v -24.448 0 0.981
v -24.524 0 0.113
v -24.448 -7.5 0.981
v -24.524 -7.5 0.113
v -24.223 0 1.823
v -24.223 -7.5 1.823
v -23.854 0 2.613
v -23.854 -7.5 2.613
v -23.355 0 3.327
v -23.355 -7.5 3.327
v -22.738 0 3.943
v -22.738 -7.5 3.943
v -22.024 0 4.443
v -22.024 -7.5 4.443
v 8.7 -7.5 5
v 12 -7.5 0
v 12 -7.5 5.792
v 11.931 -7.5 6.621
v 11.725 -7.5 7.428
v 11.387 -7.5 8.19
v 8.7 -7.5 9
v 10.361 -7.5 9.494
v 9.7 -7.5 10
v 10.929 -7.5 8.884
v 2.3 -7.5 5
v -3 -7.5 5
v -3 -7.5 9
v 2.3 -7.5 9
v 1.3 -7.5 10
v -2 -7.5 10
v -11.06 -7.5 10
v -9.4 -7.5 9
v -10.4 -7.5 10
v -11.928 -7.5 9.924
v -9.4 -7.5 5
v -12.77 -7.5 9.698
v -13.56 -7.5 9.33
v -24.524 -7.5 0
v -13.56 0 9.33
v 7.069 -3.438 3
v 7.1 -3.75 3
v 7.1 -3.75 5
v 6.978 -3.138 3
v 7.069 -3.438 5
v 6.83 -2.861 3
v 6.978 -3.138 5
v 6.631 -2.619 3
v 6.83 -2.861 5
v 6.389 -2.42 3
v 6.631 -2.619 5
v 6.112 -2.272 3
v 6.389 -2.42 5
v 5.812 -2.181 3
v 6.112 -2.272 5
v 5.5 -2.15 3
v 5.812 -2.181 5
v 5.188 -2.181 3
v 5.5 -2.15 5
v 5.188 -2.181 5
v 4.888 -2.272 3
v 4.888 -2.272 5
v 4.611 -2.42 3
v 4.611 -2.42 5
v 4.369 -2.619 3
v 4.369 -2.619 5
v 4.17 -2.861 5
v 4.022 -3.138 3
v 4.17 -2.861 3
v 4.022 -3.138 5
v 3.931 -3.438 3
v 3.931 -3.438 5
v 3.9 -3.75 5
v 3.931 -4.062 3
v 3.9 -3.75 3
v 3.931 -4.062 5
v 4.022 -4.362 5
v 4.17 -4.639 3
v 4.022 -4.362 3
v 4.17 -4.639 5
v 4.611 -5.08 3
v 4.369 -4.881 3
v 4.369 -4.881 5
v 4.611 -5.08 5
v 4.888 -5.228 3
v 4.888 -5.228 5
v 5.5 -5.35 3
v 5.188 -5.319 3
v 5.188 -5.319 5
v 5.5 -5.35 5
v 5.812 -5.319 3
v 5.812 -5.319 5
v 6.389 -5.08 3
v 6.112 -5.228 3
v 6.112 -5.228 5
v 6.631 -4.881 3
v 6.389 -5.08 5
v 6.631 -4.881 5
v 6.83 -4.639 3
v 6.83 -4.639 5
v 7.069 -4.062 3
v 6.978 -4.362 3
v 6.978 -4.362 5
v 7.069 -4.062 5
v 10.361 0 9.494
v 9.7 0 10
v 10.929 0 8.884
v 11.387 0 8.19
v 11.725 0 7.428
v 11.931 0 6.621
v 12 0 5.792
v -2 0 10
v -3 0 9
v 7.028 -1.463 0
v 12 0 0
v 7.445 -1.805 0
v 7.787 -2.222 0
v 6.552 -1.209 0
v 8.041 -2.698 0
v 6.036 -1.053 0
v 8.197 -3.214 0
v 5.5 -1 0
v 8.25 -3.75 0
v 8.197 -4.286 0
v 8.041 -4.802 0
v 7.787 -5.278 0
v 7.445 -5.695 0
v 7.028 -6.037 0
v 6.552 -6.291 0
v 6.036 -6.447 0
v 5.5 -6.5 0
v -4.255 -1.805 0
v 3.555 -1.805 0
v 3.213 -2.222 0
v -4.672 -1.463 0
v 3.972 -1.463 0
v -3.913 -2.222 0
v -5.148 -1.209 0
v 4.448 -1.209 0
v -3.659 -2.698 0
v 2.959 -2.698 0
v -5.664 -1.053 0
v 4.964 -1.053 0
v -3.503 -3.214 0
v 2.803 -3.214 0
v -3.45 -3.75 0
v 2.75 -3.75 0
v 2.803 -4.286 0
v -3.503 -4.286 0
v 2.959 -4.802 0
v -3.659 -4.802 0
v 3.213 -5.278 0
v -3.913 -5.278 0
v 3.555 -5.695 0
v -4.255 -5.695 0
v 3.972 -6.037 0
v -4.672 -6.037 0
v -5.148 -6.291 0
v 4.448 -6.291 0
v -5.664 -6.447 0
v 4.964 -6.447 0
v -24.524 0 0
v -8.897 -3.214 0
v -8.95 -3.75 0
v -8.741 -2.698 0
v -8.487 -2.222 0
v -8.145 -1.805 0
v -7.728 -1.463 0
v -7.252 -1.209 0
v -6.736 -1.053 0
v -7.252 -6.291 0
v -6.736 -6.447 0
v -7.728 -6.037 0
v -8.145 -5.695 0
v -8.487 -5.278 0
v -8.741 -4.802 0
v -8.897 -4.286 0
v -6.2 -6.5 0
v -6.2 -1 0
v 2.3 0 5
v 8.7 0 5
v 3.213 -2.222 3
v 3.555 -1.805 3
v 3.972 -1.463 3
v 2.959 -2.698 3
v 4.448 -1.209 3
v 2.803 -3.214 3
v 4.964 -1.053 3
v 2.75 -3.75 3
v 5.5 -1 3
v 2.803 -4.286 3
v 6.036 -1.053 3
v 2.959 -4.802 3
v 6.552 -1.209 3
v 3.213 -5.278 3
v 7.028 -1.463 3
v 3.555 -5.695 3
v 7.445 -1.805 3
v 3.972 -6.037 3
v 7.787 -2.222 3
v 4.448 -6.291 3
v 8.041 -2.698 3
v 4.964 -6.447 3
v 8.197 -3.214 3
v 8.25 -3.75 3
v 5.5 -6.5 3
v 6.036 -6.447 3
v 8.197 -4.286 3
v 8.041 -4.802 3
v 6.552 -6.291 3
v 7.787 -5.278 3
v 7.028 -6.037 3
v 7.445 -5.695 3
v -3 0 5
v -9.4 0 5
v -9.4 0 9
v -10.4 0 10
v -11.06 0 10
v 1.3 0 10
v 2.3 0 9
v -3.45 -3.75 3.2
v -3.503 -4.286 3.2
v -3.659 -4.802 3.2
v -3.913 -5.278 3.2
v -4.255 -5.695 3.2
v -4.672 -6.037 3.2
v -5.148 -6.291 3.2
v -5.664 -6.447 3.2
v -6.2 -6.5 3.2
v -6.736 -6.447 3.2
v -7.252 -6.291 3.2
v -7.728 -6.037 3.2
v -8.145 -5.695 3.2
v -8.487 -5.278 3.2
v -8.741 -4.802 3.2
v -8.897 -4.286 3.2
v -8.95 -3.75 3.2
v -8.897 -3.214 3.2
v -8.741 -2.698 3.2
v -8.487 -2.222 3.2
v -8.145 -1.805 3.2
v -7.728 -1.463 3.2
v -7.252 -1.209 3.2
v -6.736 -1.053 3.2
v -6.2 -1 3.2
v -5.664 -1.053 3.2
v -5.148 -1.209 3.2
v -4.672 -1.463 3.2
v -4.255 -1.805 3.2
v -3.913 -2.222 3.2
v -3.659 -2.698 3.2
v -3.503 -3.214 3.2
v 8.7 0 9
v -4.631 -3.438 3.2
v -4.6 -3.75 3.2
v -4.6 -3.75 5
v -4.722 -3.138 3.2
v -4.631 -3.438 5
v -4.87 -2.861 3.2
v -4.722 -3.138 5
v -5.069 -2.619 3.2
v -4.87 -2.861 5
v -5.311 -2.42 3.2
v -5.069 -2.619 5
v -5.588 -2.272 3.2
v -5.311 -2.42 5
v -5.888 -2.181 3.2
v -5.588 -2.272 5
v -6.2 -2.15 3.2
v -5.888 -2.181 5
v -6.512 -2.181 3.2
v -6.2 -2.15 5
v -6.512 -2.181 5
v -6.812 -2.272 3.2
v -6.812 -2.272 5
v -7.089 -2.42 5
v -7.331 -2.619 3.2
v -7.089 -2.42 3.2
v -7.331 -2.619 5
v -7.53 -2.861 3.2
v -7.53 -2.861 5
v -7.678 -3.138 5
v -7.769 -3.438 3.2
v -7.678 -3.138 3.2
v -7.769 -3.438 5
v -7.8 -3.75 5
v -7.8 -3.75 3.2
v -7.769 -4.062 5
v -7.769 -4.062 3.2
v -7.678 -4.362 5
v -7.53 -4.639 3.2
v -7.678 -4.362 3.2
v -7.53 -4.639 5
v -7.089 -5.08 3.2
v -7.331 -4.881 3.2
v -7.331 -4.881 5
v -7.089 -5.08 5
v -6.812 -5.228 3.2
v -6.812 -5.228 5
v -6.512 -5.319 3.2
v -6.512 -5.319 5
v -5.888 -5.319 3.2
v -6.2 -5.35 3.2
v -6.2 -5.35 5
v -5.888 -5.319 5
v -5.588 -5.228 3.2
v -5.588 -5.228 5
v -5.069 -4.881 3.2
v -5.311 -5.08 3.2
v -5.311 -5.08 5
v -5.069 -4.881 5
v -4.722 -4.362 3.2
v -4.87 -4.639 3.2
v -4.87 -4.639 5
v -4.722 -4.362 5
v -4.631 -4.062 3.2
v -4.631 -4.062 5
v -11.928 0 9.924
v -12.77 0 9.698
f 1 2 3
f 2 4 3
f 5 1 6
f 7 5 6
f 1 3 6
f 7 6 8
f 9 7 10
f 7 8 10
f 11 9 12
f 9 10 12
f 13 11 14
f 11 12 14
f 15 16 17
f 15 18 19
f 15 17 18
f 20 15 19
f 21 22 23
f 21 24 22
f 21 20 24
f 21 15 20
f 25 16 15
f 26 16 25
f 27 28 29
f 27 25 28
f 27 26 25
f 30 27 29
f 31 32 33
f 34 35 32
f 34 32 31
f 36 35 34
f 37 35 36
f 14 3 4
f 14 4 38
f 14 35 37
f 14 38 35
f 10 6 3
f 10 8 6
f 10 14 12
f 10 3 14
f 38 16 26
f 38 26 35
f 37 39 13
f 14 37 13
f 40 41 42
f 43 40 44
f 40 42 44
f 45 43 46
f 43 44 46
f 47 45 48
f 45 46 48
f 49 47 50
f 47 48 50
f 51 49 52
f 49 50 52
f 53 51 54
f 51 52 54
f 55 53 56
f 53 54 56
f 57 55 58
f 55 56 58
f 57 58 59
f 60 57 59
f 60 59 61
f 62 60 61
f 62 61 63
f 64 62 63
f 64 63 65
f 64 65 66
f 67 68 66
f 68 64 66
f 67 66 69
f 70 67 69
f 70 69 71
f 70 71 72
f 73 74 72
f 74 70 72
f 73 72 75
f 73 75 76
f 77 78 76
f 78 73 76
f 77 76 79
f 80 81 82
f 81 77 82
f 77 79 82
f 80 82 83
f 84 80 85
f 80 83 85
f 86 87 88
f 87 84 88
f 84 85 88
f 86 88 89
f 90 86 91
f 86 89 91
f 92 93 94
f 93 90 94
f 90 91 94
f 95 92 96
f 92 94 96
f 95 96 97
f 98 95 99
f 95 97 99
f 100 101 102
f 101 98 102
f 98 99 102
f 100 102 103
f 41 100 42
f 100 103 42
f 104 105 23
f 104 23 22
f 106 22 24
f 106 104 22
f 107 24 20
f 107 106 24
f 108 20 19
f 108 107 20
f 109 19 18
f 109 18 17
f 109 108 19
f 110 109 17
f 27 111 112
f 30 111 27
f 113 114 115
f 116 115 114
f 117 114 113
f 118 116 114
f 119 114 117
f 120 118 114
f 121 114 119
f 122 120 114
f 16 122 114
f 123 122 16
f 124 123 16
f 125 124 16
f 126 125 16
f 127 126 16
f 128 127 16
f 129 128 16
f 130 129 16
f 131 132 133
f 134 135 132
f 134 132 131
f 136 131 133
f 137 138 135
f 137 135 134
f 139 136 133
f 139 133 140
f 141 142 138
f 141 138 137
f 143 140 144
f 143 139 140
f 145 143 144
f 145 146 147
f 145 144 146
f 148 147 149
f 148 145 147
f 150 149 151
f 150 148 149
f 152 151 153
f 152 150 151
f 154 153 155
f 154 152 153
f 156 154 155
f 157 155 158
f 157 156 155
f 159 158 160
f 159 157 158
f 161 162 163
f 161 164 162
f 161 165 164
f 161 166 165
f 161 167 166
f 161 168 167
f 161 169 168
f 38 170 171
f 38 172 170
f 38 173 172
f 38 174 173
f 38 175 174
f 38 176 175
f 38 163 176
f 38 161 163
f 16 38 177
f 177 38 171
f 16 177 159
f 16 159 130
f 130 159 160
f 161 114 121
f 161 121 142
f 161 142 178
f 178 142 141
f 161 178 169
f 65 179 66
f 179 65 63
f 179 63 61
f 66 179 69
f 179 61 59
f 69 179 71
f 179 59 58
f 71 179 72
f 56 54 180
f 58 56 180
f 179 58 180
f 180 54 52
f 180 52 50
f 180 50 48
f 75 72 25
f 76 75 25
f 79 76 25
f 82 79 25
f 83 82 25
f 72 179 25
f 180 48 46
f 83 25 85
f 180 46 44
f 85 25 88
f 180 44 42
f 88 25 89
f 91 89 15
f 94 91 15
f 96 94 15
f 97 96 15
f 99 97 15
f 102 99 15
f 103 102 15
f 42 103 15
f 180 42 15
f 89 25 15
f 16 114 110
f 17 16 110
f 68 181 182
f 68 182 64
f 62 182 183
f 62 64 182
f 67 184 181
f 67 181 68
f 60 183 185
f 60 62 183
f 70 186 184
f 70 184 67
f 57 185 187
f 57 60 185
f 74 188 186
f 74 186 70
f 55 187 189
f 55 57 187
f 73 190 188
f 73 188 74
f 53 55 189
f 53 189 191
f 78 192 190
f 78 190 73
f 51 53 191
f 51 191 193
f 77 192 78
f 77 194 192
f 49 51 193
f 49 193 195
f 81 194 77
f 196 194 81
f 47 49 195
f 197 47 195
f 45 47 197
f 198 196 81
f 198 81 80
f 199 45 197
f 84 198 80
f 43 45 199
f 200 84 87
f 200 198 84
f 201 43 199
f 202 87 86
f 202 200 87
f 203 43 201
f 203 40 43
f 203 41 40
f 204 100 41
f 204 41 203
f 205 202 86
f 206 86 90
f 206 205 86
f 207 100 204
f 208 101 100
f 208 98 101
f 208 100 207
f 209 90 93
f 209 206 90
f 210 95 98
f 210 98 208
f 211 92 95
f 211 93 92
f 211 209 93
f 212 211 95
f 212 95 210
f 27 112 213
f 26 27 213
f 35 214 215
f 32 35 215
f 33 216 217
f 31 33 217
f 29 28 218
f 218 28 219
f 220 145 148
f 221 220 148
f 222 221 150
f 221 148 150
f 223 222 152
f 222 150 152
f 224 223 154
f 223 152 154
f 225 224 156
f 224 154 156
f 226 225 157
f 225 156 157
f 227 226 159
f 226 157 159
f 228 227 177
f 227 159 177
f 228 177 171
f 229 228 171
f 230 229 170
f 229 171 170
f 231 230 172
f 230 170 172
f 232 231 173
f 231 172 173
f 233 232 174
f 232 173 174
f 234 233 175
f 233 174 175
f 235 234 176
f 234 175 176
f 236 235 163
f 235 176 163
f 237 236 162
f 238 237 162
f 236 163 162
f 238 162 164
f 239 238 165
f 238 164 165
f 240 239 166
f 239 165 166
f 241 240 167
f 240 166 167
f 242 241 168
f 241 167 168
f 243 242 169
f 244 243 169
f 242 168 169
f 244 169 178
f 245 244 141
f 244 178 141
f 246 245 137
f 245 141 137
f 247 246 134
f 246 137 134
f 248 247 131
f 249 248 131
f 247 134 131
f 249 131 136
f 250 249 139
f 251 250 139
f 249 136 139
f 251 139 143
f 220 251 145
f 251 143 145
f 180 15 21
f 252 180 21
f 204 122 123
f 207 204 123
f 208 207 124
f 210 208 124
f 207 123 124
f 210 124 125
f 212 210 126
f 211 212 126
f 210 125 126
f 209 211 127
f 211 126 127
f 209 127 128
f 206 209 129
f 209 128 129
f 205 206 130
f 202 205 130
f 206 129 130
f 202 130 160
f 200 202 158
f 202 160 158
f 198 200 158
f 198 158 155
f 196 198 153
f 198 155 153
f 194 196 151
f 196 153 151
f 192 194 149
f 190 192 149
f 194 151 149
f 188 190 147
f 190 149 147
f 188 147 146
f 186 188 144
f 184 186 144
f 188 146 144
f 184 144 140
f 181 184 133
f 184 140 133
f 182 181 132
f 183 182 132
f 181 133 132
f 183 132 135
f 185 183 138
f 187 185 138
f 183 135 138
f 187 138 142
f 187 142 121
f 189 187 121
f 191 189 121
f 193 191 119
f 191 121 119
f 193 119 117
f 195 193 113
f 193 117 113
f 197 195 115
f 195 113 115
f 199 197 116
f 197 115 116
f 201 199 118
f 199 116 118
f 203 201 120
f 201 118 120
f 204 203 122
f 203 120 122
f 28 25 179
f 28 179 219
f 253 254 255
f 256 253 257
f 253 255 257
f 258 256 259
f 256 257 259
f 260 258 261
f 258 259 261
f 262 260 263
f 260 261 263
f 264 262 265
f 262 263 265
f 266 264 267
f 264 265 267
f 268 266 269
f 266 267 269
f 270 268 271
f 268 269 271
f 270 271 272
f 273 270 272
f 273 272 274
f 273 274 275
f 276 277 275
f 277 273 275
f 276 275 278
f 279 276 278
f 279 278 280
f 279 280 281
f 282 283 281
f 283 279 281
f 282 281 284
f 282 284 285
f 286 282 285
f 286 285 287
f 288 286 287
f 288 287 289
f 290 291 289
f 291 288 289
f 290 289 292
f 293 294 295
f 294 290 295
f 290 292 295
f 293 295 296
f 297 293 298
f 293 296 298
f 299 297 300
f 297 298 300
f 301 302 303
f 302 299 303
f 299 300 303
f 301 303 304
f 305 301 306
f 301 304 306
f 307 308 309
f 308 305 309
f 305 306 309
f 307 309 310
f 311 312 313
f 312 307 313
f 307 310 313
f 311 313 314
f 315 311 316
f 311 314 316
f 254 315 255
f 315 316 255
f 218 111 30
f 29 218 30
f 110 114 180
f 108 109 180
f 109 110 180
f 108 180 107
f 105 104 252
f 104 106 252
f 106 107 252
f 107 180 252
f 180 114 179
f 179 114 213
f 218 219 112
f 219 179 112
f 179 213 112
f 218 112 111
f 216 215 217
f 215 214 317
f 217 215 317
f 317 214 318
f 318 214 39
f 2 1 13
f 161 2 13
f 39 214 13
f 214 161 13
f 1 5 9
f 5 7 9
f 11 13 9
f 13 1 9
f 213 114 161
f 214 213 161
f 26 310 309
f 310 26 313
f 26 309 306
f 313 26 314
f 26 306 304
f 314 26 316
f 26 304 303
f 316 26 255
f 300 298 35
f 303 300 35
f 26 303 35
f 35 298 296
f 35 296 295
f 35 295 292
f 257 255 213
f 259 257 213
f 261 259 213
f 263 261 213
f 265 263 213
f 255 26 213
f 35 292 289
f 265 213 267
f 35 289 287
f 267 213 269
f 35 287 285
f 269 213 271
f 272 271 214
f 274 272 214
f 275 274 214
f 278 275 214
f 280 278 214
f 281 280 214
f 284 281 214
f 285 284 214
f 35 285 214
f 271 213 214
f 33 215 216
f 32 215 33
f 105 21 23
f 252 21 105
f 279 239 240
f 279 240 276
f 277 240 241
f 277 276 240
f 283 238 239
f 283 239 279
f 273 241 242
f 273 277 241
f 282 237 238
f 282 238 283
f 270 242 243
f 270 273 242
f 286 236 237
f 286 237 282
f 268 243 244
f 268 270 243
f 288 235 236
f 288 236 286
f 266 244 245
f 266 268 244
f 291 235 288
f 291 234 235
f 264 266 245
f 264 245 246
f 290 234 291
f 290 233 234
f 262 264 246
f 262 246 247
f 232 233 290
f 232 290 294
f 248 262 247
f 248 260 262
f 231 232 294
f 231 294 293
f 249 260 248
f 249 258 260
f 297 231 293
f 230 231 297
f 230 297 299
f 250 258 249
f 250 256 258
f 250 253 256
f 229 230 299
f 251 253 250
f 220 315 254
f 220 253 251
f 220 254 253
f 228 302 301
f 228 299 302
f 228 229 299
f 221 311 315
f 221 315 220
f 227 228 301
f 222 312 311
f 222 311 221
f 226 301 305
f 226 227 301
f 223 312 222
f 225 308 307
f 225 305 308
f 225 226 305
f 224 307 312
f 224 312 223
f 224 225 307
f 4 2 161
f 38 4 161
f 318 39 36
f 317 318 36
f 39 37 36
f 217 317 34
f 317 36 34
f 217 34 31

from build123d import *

# Parameters (mm, degrees)
F1_DEPTH     = 7.5
F2_R         = 1.6
F3_DEPTH     = 5.001
F4_R         = 2.75
F4_R_2       = 1.6
F5_DEPTH     = 3.2
F6_R         = 5
F7_SIZE      = 1
F8_DEPTH     = 12
F9_W         = 6.4
F9_H         = 5
F10_DEPTH    = 7.501
F11_SIZE     = 1
F12_T1_DEPTH = 28.5416254125
F13_R        = 1.6
F14_DEPTH    = 5.001
F15_R        = 2.75
F15_R_2      = 1.6
F16_DEPTH    = 3


# Not quite as in the source:
# - a fillet or chamfer that OpenCascade refuses, or shapes differently, is made with other operations: its cross-section is extruded or revolved along the edge and cut away or added


with BuildPart() as f1:
    # F0 (on Front) → F1 (new body)
    with BuildSketch(Plane.XZ):
        Polygon((-24.524355653, 0), (0, 0), (0, 10), (-3, 10), (-3, 5), (-9.4, 5), (-9.4, 10), (-12.4, 10), (-24.524355653, 3), align=None)
    extrude(amount=F1_DEPTH)

    # F2 (on face) → F3 (cut, through all)
    with BuildSketch(Plane.XY.offset(5)):
        with Locations((-6.2, -3.75)):
            Circle(F2_R)
    extrude(amount=-F3_DEPTH, mode=Mode.SUBTRACT)

    # F4 (on face) → F5 (cut)
    with BuildSketch(Plane(origin=(0, 0, 0), x_dir=(1, 0, 0), z_dir=(0, 0, -1))):
        with Locations((-6.2, 3.75)):
            Circle(F4_R)
        with Locations((-6.2, 3.75)):
            Circle(F4_R_2, mode=Mode.SUBTRACT)
    extrude(amount=-F5_DEPTH, mode=Mode.SUBTRACT)

    # F6
    f6_edges = [f1.edges().sort_by_distance(p)[0] for p in [
        (-12.4, -3.75, 10),
        (-24.524356, -3.75, 3),
    ]]
    fillet(f6_edges, radius=F6_R)

    # F7
    f7_edges = [f1.edges().sort_by_distance(p)[0] for p in [
        (-9.4, -3.75, 10),
        (-3, -3.75, 10),
    ]]
    chamfer(f7_edges, length=F7_SIZE)

    # F8 (add): a face of the model
    f8_faces = [f1.faces().sort_by_distance(p)[0] for p in [
        (0, -3.75, 5),
    ]]
    extrude(f8_faces, amount=F8_DEPTH)

    # F9 (on face) → F10 (cut, through all)
    with BuildSketch(Plane.XZ.offset(7.5)):
        with Locations((5.5, 7.5)):
            Rectangle(F9_W, F9_H)
    extrude(amount=-F10_DEPTH, mode=Mode.SUBTRACT)

    # F11
    f11_edges = [f1.edges().sort_by_distance(p)[0] for p in [
        (2.3, -3.75, 10),
        (8.7, -3.75, 10),
    ]]
    chamfer(f11_edges, length=F11_SIZE)

    # F12: fillet of radius 5 on 1 edges, made by hand

    # F12_s2 → F12_t1 (cut)
    with BuildSketch(Plane.XZ.offset(-10.5208127063)):
        with BuildLine():
            ThreePointArc((9.7, 10), (11.3874821937, 8.1895906792), (12, 5.7916749175))
            Line((12, 5.7916749175), (12, 10))
            Line((12, 10), (9.7, 10))
        make_face()
    extrude(amount=F12_T1_DEPTH, mode=Mode.SUBTRACT)

    # F13 (on face) → F14 (cut, through all)
    with BuildSketch(Plane.XY.offset(5)):
        with Locations((5.5, -3.75)):
            Circle(F13_R)
    extrude(amount=-F14_DEPTH, mode=Mode.SUBTRACT)

    # F15 (on face) → F16 (cut)
    with BuildSketch(Plane(origin=(0, 0, 0), x_dir=(1, 0, 0), z_dir=(0, 0, -1))):
        with Locations((5.5, 3.75)):
            Circle(F15_R)
        with Locations((5.5, 3.75)):
            Circle(F15_R_2, mode=Mode.SUBTRACT)
    extrude(amount=-F16_DEPTH, mode=Mode.SUBTRACT)


solid = f1.part
